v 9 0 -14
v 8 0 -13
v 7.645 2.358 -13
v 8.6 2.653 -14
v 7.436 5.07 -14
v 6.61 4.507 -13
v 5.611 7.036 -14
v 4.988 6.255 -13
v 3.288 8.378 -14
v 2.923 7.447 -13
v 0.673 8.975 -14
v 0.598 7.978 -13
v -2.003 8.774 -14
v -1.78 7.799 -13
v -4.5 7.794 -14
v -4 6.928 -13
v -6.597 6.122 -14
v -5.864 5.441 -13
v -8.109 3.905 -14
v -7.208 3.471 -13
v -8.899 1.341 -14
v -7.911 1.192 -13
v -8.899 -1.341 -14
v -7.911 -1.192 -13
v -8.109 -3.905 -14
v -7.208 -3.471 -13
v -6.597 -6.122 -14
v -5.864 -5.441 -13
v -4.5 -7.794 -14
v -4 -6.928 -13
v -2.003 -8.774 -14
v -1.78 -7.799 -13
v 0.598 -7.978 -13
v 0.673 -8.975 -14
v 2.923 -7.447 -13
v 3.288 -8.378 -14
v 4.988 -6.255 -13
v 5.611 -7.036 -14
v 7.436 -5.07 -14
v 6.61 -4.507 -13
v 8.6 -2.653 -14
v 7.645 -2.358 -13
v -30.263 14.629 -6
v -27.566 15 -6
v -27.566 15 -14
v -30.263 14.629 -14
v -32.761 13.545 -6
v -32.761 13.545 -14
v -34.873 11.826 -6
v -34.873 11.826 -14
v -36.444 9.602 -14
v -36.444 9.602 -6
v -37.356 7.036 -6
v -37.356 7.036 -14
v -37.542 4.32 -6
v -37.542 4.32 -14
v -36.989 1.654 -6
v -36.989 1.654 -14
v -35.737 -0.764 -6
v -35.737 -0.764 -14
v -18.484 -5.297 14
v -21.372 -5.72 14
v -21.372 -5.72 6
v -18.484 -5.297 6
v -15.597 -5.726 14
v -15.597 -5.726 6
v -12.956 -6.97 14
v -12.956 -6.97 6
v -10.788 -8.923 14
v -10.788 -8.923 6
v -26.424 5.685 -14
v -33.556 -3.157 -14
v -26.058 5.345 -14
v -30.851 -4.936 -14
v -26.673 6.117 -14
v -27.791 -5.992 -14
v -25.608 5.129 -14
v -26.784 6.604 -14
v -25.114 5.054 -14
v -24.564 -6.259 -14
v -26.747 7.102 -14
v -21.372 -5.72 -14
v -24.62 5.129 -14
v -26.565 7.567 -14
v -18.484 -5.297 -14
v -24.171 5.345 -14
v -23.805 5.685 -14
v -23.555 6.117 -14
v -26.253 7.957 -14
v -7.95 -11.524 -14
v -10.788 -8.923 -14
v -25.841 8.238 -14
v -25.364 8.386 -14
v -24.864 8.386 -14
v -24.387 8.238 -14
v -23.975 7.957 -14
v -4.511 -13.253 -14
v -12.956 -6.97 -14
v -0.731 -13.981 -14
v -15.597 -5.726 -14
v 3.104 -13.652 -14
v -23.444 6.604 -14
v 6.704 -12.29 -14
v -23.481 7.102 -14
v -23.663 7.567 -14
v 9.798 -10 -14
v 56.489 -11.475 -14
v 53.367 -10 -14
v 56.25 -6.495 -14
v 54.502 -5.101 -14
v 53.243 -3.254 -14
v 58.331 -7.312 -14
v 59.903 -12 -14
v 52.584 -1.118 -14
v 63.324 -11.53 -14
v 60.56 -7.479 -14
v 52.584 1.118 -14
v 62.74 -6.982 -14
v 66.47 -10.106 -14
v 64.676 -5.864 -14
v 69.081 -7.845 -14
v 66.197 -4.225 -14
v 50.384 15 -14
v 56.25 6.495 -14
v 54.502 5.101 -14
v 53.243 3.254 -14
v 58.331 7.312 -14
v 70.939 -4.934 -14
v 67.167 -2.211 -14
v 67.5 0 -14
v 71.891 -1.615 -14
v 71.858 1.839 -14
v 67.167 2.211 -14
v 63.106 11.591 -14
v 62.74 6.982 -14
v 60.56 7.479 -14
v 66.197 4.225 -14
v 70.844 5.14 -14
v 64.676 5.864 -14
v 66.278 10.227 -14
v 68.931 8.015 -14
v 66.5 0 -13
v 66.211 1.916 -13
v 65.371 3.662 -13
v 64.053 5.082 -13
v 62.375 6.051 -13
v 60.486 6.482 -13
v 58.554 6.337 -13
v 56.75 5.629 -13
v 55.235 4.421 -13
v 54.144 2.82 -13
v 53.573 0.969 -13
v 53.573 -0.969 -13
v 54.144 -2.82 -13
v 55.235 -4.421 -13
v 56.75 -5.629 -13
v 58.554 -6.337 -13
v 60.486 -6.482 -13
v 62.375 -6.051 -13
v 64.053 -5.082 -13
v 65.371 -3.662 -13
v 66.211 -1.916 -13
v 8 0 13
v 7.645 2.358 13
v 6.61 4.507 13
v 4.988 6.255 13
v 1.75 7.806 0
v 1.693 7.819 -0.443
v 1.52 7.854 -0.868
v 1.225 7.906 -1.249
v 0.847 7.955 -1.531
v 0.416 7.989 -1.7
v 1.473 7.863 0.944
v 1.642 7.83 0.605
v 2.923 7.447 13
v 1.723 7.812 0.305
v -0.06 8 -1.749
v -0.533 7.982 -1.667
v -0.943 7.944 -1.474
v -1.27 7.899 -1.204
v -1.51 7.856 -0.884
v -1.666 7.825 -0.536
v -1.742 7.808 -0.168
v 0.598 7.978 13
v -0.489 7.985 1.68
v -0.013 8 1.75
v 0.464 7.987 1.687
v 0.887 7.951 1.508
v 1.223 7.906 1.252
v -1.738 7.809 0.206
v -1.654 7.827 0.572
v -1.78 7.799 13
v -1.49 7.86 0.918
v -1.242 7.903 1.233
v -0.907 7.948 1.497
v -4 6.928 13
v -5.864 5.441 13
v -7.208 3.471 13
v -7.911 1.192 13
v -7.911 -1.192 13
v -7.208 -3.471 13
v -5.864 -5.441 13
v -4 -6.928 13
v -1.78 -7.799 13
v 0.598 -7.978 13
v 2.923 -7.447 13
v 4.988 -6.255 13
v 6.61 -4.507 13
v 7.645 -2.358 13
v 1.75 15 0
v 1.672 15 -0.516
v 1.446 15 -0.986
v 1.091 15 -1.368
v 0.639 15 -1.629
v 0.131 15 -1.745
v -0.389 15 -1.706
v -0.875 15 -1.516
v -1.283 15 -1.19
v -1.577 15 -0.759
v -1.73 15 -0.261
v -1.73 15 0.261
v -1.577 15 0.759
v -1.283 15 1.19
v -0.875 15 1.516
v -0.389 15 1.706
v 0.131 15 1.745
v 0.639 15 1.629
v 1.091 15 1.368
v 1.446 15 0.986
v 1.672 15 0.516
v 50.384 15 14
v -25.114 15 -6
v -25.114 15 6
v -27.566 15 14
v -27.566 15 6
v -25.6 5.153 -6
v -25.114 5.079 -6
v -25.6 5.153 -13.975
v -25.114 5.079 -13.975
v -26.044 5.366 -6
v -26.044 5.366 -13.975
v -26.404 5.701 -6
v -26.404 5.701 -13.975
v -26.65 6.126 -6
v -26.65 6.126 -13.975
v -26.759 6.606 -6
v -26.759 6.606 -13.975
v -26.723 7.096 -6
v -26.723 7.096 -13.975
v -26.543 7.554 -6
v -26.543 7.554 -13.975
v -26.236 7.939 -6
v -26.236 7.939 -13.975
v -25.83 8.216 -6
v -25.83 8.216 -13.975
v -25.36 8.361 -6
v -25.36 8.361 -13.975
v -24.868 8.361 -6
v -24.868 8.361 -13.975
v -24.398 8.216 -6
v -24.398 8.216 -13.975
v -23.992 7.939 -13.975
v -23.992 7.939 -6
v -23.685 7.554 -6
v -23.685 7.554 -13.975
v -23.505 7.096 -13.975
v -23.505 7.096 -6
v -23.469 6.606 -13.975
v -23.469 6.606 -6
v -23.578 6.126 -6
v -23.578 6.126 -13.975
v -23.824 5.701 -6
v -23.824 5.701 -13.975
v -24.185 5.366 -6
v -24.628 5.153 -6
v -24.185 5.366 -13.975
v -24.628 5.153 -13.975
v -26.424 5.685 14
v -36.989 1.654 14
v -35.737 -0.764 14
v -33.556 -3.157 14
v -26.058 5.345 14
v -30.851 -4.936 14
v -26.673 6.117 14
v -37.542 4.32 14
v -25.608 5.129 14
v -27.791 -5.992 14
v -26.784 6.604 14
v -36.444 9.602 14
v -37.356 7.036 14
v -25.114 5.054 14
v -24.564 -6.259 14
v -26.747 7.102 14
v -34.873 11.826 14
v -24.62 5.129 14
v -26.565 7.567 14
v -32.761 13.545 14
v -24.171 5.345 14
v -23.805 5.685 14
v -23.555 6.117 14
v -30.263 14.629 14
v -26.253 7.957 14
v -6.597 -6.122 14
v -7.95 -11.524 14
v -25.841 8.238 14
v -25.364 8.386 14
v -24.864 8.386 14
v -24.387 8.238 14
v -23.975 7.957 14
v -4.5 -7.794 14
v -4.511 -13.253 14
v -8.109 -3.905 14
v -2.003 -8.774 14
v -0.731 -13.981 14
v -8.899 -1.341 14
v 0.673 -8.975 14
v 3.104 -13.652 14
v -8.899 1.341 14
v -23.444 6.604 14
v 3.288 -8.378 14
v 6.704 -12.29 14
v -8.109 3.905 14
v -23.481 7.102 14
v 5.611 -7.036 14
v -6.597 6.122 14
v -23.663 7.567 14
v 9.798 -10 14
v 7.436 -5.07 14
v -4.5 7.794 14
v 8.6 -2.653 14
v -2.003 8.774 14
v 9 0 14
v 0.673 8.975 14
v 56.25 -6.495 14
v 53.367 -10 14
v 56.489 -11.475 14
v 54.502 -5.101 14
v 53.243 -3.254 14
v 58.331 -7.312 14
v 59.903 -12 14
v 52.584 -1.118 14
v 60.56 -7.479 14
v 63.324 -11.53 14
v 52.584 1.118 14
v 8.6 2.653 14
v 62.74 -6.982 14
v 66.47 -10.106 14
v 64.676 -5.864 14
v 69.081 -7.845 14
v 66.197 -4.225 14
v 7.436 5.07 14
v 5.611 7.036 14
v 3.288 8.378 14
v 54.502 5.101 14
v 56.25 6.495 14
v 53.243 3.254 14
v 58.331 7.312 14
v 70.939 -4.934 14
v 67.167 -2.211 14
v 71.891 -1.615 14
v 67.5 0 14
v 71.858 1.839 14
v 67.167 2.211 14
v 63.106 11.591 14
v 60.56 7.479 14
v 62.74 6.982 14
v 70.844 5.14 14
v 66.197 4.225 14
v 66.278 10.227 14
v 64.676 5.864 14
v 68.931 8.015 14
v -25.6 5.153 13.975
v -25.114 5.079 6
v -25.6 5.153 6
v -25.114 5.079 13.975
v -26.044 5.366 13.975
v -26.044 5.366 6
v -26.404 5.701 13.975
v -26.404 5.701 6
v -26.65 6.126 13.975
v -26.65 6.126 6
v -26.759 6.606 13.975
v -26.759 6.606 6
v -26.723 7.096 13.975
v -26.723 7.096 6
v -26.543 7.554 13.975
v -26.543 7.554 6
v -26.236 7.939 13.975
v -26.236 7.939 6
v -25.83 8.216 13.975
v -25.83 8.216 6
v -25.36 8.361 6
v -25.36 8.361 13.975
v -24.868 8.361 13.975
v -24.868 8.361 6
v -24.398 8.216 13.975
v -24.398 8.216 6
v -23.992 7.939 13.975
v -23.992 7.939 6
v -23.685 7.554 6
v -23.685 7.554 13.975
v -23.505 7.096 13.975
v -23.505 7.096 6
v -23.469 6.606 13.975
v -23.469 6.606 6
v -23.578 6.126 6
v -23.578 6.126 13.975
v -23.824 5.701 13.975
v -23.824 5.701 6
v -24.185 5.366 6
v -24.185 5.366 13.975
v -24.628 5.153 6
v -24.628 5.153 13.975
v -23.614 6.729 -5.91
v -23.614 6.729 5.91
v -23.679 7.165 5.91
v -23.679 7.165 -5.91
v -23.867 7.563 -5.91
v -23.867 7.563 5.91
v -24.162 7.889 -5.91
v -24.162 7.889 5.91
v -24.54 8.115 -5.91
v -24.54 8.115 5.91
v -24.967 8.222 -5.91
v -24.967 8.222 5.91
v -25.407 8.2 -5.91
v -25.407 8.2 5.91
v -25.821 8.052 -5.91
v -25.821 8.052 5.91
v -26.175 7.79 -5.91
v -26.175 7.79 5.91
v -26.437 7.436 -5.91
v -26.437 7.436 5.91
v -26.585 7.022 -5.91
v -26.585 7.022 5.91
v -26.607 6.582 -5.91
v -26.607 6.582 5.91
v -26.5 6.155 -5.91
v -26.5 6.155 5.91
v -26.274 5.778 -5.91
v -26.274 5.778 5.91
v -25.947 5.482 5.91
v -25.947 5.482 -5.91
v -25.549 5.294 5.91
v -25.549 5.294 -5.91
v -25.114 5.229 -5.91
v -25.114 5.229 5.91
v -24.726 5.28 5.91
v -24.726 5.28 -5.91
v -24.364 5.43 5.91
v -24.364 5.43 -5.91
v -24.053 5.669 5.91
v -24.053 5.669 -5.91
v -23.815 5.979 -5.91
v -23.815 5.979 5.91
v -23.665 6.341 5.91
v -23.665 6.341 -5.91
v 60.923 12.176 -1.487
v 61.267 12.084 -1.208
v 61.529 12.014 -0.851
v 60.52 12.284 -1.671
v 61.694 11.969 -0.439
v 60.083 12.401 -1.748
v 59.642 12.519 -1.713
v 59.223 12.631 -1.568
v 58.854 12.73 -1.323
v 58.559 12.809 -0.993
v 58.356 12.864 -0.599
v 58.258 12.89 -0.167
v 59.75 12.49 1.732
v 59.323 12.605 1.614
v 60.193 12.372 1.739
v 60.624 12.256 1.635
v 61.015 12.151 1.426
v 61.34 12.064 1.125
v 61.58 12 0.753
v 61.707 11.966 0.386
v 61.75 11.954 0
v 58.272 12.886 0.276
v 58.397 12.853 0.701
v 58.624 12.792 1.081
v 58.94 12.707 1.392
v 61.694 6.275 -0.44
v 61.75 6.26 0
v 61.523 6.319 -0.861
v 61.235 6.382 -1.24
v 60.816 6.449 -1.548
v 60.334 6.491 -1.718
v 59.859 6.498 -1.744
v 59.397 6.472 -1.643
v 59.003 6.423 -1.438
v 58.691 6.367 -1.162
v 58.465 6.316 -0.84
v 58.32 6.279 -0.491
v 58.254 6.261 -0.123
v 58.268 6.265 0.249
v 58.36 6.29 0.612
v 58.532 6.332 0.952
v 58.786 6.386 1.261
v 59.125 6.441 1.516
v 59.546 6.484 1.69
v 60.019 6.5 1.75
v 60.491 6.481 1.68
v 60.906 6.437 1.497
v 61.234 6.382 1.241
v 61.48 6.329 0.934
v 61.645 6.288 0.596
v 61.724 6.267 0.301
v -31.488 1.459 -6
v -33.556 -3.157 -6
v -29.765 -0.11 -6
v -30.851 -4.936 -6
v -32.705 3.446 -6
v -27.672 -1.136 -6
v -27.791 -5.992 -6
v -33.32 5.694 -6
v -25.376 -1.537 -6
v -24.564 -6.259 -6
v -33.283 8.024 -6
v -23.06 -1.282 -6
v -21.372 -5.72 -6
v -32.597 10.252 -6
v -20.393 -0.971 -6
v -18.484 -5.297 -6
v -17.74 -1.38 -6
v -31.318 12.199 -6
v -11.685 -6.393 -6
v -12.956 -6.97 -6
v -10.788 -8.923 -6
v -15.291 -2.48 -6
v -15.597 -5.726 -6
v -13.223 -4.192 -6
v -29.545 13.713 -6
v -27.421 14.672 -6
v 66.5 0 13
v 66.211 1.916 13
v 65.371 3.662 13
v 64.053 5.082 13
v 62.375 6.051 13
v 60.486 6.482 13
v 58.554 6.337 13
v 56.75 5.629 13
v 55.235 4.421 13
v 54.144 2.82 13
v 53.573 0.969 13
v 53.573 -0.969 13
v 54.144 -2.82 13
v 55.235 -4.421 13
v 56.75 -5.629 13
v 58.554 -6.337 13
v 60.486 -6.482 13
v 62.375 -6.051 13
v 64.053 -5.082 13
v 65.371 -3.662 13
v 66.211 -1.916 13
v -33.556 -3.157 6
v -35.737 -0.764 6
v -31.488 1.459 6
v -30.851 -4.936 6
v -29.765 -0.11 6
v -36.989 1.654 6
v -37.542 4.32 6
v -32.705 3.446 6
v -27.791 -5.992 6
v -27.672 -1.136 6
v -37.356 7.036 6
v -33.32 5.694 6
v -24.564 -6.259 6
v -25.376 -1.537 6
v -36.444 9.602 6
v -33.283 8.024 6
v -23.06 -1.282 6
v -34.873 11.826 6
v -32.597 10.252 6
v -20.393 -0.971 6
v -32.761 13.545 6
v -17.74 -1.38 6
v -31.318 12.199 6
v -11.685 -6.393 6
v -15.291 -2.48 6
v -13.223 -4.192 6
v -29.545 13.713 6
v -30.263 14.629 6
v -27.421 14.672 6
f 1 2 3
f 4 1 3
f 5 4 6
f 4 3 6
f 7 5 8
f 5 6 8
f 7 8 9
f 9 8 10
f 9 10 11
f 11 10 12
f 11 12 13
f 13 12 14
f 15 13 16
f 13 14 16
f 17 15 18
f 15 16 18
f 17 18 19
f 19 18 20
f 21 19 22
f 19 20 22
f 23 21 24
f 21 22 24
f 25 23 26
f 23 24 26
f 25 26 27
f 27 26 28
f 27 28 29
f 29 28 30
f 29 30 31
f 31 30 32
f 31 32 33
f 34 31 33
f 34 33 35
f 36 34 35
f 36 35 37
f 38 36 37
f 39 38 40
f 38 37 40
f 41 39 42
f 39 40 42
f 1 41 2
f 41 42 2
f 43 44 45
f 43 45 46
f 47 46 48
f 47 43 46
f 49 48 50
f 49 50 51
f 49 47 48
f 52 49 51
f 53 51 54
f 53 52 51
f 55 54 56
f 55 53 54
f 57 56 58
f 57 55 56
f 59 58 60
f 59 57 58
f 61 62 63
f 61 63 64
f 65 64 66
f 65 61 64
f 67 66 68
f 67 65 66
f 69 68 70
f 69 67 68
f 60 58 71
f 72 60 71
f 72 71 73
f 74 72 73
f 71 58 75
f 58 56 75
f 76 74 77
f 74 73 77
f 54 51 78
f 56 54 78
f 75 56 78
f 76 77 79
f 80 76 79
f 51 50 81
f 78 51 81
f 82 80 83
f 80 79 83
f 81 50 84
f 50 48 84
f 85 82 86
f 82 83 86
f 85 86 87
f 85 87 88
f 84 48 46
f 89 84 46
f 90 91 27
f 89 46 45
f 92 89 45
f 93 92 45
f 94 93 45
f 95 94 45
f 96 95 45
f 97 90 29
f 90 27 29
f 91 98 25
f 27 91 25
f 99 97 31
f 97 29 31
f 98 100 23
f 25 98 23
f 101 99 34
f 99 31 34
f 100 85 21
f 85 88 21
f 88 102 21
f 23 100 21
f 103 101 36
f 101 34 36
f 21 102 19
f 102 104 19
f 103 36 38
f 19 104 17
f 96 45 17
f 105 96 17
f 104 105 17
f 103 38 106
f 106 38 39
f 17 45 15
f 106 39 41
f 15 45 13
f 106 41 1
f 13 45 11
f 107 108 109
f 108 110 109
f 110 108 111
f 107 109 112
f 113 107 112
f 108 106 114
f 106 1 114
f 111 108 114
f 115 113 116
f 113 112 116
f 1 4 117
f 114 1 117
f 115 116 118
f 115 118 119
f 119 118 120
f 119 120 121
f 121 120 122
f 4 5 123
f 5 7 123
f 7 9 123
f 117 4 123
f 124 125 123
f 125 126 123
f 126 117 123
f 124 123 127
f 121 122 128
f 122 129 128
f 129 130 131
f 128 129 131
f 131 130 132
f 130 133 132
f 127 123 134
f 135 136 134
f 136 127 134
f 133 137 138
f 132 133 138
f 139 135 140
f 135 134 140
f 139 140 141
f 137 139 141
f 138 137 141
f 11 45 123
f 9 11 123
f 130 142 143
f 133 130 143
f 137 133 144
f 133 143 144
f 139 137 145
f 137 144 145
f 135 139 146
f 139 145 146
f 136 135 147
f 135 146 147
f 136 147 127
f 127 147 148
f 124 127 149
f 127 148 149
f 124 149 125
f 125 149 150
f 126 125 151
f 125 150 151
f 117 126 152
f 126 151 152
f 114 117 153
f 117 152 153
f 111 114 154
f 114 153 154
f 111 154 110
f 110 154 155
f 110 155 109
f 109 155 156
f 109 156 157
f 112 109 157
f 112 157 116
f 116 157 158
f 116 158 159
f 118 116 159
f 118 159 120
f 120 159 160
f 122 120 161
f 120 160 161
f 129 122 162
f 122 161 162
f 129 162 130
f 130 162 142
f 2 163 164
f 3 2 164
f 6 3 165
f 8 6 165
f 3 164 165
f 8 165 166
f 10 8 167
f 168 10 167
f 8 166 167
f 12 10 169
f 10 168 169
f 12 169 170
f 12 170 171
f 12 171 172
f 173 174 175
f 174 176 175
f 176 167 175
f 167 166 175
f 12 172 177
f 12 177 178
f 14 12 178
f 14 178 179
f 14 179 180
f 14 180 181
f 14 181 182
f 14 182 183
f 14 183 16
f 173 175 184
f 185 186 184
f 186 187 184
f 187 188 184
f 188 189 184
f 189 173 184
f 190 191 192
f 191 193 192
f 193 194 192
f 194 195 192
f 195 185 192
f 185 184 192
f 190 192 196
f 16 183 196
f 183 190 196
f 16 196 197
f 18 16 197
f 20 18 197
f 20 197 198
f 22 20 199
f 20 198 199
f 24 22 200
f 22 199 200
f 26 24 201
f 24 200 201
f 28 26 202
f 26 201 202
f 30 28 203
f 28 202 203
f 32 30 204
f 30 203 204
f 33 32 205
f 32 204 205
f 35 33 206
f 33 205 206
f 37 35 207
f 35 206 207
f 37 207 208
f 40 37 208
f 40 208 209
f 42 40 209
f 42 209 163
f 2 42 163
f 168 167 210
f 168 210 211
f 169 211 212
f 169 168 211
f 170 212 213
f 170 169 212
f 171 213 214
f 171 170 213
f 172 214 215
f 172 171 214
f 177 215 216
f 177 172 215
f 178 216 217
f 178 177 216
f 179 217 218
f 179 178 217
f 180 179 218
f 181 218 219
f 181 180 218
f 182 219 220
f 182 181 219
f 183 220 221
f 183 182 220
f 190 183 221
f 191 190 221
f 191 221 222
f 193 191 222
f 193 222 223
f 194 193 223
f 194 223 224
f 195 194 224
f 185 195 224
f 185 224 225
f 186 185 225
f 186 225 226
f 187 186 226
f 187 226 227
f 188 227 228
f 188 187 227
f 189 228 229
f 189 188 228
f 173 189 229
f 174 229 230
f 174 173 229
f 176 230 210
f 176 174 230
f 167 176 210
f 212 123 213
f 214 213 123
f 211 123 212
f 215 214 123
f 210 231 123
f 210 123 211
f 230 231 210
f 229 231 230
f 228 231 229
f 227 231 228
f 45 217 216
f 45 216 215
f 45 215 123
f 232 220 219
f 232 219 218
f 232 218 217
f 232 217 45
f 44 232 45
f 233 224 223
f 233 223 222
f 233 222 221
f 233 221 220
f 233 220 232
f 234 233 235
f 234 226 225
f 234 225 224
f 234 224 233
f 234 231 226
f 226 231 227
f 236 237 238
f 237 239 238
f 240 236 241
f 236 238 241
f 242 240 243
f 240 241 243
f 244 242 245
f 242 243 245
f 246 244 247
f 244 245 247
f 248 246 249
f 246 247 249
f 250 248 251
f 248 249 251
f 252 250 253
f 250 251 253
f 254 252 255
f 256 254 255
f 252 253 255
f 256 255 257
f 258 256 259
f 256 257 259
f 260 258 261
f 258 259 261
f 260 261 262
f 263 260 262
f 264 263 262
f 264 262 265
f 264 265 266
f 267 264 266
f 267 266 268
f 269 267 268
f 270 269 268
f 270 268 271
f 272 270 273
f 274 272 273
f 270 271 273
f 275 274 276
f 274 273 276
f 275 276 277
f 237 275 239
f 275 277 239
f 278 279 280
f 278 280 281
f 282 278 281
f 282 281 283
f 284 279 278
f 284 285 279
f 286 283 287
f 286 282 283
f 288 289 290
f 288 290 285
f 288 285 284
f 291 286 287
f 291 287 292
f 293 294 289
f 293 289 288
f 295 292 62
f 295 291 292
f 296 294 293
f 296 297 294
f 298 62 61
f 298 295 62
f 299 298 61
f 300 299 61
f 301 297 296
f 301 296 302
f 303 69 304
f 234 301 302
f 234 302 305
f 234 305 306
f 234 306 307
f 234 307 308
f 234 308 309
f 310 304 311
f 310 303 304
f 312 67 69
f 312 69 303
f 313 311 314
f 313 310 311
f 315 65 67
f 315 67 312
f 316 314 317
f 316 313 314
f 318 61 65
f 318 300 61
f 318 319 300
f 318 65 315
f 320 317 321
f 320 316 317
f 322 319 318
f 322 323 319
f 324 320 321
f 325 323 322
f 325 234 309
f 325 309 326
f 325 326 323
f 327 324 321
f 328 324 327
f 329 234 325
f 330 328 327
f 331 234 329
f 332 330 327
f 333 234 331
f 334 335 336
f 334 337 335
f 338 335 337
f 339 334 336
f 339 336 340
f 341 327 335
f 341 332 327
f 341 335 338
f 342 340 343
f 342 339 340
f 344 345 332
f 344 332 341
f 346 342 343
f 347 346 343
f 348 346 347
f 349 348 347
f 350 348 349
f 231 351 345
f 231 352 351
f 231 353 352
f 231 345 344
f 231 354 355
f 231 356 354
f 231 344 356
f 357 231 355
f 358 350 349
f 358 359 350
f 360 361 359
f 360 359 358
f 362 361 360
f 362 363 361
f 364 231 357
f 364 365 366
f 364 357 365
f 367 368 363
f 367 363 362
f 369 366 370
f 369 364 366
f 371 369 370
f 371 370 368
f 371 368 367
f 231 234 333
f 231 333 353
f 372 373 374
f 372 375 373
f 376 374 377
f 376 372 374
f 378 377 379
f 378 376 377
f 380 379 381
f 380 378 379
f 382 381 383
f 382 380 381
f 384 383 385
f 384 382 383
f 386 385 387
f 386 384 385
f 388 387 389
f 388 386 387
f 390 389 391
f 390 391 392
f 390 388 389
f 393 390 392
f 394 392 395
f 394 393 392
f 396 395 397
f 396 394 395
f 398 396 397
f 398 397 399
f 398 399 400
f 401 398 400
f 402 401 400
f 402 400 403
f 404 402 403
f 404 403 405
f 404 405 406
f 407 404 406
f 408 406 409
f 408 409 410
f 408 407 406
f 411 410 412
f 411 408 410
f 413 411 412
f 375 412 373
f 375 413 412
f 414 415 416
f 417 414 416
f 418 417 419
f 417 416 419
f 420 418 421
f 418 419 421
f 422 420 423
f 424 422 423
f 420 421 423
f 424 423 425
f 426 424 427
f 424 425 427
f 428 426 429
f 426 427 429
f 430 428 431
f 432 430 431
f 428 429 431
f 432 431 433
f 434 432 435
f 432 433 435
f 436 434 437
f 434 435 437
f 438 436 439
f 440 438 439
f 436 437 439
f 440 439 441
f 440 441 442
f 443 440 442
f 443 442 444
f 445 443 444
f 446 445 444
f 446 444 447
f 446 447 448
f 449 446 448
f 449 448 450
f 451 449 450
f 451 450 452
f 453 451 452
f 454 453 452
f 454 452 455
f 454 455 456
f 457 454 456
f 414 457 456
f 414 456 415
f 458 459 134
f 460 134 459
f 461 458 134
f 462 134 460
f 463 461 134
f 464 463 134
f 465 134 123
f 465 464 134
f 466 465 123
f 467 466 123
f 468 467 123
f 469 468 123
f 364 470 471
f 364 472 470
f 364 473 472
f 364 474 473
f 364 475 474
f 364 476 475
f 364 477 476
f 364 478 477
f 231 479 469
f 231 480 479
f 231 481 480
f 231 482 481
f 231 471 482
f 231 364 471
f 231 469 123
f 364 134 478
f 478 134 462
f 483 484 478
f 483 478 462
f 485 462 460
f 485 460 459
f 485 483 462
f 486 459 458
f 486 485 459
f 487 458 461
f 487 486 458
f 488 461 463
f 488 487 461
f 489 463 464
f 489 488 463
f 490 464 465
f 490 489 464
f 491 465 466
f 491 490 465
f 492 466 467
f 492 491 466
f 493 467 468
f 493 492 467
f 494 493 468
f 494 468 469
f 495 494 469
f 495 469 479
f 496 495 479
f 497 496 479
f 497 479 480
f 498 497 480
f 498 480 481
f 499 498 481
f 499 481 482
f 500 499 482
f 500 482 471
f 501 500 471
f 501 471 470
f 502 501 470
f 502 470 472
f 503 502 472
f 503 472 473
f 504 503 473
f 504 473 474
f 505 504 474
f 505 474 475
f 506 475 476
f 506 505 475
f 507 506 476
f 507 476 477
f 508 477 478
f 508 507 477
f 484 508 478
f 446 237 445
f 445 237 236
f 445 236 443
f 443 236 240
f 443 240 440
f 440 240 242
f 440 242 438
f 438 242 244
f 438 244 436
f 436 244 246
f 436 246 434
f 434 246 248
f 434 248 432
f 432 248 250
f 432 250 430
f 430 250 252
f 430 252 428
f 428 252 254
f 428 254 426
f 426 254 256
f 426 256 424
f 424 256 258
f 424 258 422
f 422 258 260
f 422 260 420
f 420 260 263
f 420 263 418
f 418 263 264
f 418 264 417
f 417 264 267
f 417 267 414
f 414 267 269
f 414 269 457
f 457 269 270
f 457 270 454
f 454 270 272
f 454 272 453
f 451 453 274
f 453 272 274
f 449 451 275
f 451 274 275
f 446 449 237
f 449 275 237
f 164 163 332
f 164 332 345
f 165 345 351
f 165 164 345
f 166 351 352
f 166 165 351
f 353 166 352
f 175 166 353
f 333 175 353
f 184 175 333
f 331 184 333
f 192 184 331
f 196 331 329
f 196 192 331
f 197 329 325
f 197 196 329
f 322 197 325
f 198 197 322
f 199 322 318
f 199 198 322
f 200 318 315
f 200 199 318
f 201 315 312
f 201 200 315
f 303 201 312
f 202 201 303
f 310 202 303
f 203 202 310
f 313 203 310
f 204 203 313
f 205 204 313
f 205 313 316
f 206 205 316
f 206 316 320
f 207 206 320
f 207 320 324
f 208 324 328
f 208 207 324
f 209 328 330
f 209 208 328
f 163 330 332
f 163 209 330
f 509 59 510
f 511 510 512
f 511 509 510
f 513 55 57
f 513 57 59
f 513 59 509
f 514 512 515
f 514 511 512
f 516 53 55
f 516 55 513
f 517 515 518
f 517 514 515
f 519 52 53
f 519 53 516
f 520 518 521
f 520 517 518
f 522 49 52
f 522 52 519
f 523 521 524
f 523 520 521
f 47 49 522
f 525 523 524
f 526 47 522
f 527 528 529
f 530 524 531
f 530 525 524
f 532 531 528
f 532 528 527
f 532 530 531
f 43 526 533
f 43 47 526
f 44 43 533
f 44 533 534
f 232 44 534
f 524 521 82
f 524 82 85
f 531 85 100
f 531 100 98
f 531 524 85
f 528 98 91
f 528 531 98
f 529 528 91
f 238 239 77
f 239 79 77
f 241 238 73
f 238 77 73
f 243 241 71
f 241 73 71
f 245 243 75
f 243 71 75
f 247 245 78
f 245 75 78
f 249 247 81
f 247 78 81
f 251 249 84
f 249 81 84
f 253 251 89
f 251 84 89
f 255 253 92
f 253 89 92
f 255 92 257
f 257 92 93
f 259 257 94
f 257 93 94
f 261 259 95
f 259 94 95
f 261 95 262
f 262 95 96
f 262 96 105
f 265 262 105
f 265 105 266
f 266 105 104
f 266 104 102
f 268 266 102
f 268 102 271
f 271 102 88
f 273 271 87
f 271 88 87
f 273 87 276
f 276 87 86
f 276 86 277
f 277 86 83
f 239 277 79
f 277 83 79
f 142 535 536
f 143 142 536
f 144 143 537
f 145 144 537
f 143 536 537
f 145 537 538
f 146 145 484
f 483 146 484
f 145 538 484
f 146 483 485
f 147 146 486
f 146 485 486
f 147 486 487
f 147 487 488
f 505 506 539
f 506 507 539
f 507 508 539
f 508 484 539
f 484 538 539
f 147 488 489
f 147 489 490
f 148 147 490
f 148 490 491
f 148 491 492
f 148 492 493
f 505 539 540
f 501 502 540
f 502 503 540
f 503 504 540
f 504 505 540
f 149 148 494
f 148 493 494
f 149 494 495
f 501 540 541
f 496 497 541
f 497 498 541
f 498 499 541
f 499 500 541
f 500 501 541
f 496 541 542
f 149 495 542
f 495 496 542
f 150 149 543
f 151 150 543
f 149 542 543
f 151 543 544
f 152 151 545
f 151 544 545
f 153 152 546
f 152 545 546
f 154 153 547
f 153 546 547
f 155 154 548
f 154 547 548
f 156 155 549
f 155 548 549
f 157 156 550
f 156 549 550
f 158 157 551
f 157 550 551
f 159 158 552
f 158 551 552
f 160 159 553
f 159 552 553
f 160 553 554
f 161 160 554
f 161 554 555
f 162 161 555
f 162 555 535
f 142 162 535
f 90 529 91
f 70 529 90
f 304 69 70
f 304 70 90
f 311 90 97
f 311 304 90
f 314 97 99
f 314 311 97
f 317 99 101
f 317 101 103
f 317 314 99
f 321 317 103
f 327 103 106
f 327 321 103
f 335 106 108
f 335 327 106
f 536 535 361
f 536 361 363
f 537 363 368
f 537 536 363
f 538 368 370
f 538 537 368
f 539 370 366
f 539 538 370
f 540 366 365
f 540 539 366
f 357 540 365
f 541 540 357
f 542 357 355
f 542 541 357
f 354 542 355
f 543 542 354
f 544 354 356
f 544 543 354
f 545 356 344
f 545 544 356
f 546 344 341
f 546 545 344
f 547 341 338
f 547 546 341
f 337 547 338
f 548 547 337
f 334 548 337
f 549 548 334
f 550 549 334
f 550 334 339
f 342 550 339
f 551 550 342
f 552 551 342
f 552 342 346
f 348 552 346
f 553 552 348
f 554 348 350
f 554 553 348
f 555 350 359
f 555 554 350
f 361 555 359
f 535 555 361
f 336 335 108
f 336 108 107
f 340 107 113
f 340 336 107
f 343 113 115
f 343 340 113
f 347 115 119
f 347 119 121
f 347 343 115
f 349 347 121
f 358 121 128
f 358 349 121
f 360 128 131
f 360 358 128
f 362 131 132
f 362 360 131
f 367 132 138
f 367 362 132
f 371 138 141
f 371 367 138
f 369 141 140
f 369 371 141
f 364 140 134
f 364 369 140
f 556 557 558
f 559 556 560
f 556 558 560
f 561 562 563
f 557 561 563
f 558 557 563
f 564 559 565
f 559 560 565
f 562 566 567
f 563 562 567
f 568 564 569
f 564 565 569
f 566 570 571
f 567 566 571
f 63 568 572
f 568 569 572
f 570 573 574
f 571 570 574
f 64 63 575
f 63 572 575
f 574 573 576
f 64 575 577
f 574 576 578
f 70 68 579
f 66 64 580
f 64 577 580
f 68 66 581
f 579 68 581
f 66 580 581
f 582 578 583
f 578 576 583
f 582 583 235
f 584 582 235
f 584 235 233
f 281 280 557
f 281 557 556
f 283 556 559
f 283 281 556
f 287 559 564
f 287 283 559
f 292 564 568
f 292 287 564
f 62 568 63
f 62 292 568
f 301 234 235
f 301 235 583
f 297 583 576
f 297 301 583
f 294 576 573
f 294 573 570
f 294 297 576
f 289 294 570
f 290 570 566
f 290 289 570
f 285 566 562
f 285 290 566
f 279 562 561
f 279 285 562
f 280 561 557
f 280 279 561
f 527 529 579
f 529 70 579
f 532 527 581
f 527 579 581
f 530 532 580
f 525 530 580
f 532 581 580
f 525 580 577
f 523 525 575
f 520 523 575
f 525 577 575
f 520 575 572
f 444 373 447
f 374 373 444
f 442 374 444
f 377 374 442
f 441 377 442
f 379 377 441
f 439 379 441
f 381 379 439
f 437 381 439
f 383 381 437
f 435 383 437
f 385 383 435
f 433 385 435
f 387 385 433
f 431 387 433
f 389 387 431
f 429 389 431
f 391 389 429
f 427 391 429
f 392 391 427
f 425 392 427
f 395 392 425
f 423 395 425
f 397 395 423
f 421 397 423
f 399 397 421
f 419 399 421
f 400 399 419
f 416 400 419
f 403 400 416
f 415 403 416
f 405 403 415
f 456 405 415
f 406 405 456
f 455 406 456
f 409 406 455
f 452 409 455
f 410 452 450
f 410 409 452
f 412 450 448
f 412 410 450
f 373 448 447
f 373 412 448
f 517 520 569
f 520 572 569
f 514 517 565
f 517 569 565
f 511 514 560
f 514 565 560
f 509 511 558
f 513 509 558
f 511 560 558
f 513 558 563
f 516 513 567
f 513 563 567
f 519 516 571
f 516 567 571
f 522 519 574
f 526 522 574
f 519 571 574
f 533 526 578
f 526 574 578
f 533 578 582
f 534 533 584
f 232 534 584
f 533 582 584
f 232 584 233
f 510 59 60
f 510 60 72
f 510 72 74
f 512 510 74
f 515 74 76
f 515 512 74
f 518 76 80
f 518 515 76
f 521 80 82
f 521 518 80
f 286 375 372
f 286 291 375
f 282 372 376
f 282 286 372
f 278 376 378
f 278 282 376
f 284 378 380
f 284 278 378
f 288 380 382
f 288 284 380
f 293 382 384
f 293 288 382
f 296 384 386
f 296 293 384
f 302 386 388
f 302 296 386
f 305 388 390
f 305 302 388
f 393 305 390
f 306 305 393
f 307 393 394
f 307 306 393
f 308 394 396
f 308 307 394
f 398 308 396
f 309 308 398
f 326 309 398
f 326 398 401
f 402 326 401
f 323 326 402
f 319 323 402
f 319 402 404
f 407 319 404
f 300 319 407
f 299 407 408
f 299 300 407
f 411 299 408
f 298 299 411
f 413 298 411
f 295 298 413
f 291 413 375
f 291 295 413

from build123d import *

# Parameters (mm, degrees)
EXTRUDE_1_DEPTH          = 14
CUT_EXTRUDE_1_DEPTH      = 6
SKETCH_3_R               = 8
CUT_EXTRUDE_2_DEPTH      = 1
CUT_EXTRUDE_2_DEPTH_BACK = 29
SKETCH_4_R               = 6.5
CUT_EXTRUDE_3_DEPTH      = 29
SKETCH_5_R               = 1.75
CUT_EXTRUDE_4_DEPTH      = 16
SKETCH_6_R               = 1.75
CUT_EXTRUDE_5_DEPTH      = 16.0000001
SKETCH_11_R              = 1.5
CUT_EXTRUDE_6_DEPTH      = 29.0000001
CHAMFER_1_SIZE           = 1


with BuildPart() as part:
    # 草图1 → 凸台-拉伸1 (new body, symmetric)
    with BuildSketch(Plane.XY):
        with BuildLine():
            Line((9.797958971, -10), (53.366750419, -10))
            ThreePointArc((53.366750419, -10), (70.93867824, -4.934097522), (63.105828541, 11.591109915))
            Line((63.105828541, 11.591109915), (50.383677548, 15))
            Line((50.383677548, 15), (-27.565507431, 15))
            ThreePointArc((-27.565507431, 15), (-36.443659616, 9.602001064), (-35.73696059, -0.764317242))
            ThreePointArc((-35.73696059, -0.764317242), (-29.353950463, -5.559863718), (-21.371826468, -5.720427806))
            ThreePointArc((-21.371826468, -5.720427806), (-15.596757504, -5.725786931), (-10.787686266, -8.923330377))
            ThreePointArc((-10.787686266, -8.923330377), (-0.731228007, -13.98089073), (9.797958971, -10))
        make_face()
    extrude(amount=EXTRUDE_1_DEPTH, both=True)

    # 草图2 → 切除-拉伸1 (cut, symmetric)
    with BuildSketch(Plane.XY):
        with BuildLine():
            Line((-25.114071484, 15), (-25.880172402, 19.294363036))
            Line((-25.880172402, 19.294363036), (-38.301734179, 16.64803031))
            Line((-38.301734179, 16.64803031), (-39.057829244, 0.337979629))
            Line((-39.057829244, 0.337979629), (-36.873567525, -9.914677417))
            Line((-36.873567525, -9.914677417), (-21.991683498, -16.836179697))
            Line((-21.991683498, -16.836179697), (-15.8349094, -12.46162968))
            Line((-15.8349094, -12.46162968), (-10.787686266, -8.923330377))
            ThreePointArc((-10.787686266, -8.923330377), (-15.290702499, -2.479910341), (-23.059900609, -1.282255262))
            ThreePointArc((-23.059900609, -1.282255262), (-33.319731944, 5.694068268), (-25.114071484, 15))
        make_face()
    extrude(amount=CUT_EXTRUDE_1_DEPTH, both=True, mode=Mode.SUBTRACT)

    # 草图3 → 切除-拉伸2 (cut, two sides)
    with BuildSketch(Plane.XY.offset(14)) as cut_extrude_2_sk:
        Circle(SKETCH_3_R)
    extrude(amount=CUT_EXTRUDE_2_DEPTH, mode=Mode.SUBTRACT)
    extrude(cut_extrude_2_sk.sketch, amount=-CUT_EXTRUDE_2_DEPTH_BACK, mode=Mode.SUBTRACT)

    # 草图4 → 切除-拉伸3 (cut, through all)
    with BuildSketch(Plane.XY.offset(14)):
        with Locations((60, 0)):
            Circle(SKETCH_4_R)
    extrude(amount=-CUT_EXTRUDE_3_DEPTH, mode=Mode.SUBTRACT)

    # 草图5 → 切除-拉伸4 (cut, through all)
    with BuildSketch(Plane(origin=(0, 0, 0), x_dir=(1, 0, 0), z_dir=(0, 1, 0))):
        Circle(SKETCH_5_R)
    extrude(amount=CUT_EXTRUDE_4_DEPTH, mode=Mode.SUBTRACT)

    # 草图6 → 切除-拉伸5 (cut, through all)
    with BuildSketch(Plane(origin=(0, 0, 0), x_dir=(1, 0, 0), z_dir=(0, 1, 0))):
        with Locations((60, 0)):
            Circle(SKETCH_6_R)
    extrude(amount=CUT_EXTRUDE_5_DEPTH, mode=Mode.SUBTRACT)

    # 草图10 → M4 螺纹孔的螺纹孔钻头1 (revolve, cut)
    with BuildSketch(Plane(origin=(-25.114071484, 6.729295173, 14), x_dir=(0, -1, 0), z_dir=(1, 0, 0))):
        Polygon((0, 0), (0, 8.991420021), (1.65, 8), (1.65, 0.025), (1.675, 0), align=None)
    hole_wizard_m4_1 = revolve(axis=Axis((-25.114071484, 6.729295173, 20.35), (0, 0, -1)), mode=Mode.SUBTRACT)

    # 镜向1: M4 螺纹孔的螺纹孔钻头1 across plane
    add(hole_wizard_m4_1.mirror(Plane.XY), mode=Mode.SUBTRACT)

    # 草图11 → 切除-拉伸6 (cut, through all)
    with BuildSketch(Plane.XY.offset(14)):
        with Locations((-25.114071484, 6.729295173)):
            Circle(SKETCH_11_R)
    extrude(amount=-CUT_EXTRUDE_6_DEPTH, mode=Mode.SUBTRACT)

    # 倒角1
    chamfer_1_edges = [part.edges().sort_by_distance(p)[0] for p in [
        (-8, 0, 14),
        (-8, 0, -14),
        (53.5, 0, -14),
        (53.5, 0, 14),
    ]]
    chamfer(chamfer_1_edges, length=CHAMFER_1_SIZE)


solid = part.part
